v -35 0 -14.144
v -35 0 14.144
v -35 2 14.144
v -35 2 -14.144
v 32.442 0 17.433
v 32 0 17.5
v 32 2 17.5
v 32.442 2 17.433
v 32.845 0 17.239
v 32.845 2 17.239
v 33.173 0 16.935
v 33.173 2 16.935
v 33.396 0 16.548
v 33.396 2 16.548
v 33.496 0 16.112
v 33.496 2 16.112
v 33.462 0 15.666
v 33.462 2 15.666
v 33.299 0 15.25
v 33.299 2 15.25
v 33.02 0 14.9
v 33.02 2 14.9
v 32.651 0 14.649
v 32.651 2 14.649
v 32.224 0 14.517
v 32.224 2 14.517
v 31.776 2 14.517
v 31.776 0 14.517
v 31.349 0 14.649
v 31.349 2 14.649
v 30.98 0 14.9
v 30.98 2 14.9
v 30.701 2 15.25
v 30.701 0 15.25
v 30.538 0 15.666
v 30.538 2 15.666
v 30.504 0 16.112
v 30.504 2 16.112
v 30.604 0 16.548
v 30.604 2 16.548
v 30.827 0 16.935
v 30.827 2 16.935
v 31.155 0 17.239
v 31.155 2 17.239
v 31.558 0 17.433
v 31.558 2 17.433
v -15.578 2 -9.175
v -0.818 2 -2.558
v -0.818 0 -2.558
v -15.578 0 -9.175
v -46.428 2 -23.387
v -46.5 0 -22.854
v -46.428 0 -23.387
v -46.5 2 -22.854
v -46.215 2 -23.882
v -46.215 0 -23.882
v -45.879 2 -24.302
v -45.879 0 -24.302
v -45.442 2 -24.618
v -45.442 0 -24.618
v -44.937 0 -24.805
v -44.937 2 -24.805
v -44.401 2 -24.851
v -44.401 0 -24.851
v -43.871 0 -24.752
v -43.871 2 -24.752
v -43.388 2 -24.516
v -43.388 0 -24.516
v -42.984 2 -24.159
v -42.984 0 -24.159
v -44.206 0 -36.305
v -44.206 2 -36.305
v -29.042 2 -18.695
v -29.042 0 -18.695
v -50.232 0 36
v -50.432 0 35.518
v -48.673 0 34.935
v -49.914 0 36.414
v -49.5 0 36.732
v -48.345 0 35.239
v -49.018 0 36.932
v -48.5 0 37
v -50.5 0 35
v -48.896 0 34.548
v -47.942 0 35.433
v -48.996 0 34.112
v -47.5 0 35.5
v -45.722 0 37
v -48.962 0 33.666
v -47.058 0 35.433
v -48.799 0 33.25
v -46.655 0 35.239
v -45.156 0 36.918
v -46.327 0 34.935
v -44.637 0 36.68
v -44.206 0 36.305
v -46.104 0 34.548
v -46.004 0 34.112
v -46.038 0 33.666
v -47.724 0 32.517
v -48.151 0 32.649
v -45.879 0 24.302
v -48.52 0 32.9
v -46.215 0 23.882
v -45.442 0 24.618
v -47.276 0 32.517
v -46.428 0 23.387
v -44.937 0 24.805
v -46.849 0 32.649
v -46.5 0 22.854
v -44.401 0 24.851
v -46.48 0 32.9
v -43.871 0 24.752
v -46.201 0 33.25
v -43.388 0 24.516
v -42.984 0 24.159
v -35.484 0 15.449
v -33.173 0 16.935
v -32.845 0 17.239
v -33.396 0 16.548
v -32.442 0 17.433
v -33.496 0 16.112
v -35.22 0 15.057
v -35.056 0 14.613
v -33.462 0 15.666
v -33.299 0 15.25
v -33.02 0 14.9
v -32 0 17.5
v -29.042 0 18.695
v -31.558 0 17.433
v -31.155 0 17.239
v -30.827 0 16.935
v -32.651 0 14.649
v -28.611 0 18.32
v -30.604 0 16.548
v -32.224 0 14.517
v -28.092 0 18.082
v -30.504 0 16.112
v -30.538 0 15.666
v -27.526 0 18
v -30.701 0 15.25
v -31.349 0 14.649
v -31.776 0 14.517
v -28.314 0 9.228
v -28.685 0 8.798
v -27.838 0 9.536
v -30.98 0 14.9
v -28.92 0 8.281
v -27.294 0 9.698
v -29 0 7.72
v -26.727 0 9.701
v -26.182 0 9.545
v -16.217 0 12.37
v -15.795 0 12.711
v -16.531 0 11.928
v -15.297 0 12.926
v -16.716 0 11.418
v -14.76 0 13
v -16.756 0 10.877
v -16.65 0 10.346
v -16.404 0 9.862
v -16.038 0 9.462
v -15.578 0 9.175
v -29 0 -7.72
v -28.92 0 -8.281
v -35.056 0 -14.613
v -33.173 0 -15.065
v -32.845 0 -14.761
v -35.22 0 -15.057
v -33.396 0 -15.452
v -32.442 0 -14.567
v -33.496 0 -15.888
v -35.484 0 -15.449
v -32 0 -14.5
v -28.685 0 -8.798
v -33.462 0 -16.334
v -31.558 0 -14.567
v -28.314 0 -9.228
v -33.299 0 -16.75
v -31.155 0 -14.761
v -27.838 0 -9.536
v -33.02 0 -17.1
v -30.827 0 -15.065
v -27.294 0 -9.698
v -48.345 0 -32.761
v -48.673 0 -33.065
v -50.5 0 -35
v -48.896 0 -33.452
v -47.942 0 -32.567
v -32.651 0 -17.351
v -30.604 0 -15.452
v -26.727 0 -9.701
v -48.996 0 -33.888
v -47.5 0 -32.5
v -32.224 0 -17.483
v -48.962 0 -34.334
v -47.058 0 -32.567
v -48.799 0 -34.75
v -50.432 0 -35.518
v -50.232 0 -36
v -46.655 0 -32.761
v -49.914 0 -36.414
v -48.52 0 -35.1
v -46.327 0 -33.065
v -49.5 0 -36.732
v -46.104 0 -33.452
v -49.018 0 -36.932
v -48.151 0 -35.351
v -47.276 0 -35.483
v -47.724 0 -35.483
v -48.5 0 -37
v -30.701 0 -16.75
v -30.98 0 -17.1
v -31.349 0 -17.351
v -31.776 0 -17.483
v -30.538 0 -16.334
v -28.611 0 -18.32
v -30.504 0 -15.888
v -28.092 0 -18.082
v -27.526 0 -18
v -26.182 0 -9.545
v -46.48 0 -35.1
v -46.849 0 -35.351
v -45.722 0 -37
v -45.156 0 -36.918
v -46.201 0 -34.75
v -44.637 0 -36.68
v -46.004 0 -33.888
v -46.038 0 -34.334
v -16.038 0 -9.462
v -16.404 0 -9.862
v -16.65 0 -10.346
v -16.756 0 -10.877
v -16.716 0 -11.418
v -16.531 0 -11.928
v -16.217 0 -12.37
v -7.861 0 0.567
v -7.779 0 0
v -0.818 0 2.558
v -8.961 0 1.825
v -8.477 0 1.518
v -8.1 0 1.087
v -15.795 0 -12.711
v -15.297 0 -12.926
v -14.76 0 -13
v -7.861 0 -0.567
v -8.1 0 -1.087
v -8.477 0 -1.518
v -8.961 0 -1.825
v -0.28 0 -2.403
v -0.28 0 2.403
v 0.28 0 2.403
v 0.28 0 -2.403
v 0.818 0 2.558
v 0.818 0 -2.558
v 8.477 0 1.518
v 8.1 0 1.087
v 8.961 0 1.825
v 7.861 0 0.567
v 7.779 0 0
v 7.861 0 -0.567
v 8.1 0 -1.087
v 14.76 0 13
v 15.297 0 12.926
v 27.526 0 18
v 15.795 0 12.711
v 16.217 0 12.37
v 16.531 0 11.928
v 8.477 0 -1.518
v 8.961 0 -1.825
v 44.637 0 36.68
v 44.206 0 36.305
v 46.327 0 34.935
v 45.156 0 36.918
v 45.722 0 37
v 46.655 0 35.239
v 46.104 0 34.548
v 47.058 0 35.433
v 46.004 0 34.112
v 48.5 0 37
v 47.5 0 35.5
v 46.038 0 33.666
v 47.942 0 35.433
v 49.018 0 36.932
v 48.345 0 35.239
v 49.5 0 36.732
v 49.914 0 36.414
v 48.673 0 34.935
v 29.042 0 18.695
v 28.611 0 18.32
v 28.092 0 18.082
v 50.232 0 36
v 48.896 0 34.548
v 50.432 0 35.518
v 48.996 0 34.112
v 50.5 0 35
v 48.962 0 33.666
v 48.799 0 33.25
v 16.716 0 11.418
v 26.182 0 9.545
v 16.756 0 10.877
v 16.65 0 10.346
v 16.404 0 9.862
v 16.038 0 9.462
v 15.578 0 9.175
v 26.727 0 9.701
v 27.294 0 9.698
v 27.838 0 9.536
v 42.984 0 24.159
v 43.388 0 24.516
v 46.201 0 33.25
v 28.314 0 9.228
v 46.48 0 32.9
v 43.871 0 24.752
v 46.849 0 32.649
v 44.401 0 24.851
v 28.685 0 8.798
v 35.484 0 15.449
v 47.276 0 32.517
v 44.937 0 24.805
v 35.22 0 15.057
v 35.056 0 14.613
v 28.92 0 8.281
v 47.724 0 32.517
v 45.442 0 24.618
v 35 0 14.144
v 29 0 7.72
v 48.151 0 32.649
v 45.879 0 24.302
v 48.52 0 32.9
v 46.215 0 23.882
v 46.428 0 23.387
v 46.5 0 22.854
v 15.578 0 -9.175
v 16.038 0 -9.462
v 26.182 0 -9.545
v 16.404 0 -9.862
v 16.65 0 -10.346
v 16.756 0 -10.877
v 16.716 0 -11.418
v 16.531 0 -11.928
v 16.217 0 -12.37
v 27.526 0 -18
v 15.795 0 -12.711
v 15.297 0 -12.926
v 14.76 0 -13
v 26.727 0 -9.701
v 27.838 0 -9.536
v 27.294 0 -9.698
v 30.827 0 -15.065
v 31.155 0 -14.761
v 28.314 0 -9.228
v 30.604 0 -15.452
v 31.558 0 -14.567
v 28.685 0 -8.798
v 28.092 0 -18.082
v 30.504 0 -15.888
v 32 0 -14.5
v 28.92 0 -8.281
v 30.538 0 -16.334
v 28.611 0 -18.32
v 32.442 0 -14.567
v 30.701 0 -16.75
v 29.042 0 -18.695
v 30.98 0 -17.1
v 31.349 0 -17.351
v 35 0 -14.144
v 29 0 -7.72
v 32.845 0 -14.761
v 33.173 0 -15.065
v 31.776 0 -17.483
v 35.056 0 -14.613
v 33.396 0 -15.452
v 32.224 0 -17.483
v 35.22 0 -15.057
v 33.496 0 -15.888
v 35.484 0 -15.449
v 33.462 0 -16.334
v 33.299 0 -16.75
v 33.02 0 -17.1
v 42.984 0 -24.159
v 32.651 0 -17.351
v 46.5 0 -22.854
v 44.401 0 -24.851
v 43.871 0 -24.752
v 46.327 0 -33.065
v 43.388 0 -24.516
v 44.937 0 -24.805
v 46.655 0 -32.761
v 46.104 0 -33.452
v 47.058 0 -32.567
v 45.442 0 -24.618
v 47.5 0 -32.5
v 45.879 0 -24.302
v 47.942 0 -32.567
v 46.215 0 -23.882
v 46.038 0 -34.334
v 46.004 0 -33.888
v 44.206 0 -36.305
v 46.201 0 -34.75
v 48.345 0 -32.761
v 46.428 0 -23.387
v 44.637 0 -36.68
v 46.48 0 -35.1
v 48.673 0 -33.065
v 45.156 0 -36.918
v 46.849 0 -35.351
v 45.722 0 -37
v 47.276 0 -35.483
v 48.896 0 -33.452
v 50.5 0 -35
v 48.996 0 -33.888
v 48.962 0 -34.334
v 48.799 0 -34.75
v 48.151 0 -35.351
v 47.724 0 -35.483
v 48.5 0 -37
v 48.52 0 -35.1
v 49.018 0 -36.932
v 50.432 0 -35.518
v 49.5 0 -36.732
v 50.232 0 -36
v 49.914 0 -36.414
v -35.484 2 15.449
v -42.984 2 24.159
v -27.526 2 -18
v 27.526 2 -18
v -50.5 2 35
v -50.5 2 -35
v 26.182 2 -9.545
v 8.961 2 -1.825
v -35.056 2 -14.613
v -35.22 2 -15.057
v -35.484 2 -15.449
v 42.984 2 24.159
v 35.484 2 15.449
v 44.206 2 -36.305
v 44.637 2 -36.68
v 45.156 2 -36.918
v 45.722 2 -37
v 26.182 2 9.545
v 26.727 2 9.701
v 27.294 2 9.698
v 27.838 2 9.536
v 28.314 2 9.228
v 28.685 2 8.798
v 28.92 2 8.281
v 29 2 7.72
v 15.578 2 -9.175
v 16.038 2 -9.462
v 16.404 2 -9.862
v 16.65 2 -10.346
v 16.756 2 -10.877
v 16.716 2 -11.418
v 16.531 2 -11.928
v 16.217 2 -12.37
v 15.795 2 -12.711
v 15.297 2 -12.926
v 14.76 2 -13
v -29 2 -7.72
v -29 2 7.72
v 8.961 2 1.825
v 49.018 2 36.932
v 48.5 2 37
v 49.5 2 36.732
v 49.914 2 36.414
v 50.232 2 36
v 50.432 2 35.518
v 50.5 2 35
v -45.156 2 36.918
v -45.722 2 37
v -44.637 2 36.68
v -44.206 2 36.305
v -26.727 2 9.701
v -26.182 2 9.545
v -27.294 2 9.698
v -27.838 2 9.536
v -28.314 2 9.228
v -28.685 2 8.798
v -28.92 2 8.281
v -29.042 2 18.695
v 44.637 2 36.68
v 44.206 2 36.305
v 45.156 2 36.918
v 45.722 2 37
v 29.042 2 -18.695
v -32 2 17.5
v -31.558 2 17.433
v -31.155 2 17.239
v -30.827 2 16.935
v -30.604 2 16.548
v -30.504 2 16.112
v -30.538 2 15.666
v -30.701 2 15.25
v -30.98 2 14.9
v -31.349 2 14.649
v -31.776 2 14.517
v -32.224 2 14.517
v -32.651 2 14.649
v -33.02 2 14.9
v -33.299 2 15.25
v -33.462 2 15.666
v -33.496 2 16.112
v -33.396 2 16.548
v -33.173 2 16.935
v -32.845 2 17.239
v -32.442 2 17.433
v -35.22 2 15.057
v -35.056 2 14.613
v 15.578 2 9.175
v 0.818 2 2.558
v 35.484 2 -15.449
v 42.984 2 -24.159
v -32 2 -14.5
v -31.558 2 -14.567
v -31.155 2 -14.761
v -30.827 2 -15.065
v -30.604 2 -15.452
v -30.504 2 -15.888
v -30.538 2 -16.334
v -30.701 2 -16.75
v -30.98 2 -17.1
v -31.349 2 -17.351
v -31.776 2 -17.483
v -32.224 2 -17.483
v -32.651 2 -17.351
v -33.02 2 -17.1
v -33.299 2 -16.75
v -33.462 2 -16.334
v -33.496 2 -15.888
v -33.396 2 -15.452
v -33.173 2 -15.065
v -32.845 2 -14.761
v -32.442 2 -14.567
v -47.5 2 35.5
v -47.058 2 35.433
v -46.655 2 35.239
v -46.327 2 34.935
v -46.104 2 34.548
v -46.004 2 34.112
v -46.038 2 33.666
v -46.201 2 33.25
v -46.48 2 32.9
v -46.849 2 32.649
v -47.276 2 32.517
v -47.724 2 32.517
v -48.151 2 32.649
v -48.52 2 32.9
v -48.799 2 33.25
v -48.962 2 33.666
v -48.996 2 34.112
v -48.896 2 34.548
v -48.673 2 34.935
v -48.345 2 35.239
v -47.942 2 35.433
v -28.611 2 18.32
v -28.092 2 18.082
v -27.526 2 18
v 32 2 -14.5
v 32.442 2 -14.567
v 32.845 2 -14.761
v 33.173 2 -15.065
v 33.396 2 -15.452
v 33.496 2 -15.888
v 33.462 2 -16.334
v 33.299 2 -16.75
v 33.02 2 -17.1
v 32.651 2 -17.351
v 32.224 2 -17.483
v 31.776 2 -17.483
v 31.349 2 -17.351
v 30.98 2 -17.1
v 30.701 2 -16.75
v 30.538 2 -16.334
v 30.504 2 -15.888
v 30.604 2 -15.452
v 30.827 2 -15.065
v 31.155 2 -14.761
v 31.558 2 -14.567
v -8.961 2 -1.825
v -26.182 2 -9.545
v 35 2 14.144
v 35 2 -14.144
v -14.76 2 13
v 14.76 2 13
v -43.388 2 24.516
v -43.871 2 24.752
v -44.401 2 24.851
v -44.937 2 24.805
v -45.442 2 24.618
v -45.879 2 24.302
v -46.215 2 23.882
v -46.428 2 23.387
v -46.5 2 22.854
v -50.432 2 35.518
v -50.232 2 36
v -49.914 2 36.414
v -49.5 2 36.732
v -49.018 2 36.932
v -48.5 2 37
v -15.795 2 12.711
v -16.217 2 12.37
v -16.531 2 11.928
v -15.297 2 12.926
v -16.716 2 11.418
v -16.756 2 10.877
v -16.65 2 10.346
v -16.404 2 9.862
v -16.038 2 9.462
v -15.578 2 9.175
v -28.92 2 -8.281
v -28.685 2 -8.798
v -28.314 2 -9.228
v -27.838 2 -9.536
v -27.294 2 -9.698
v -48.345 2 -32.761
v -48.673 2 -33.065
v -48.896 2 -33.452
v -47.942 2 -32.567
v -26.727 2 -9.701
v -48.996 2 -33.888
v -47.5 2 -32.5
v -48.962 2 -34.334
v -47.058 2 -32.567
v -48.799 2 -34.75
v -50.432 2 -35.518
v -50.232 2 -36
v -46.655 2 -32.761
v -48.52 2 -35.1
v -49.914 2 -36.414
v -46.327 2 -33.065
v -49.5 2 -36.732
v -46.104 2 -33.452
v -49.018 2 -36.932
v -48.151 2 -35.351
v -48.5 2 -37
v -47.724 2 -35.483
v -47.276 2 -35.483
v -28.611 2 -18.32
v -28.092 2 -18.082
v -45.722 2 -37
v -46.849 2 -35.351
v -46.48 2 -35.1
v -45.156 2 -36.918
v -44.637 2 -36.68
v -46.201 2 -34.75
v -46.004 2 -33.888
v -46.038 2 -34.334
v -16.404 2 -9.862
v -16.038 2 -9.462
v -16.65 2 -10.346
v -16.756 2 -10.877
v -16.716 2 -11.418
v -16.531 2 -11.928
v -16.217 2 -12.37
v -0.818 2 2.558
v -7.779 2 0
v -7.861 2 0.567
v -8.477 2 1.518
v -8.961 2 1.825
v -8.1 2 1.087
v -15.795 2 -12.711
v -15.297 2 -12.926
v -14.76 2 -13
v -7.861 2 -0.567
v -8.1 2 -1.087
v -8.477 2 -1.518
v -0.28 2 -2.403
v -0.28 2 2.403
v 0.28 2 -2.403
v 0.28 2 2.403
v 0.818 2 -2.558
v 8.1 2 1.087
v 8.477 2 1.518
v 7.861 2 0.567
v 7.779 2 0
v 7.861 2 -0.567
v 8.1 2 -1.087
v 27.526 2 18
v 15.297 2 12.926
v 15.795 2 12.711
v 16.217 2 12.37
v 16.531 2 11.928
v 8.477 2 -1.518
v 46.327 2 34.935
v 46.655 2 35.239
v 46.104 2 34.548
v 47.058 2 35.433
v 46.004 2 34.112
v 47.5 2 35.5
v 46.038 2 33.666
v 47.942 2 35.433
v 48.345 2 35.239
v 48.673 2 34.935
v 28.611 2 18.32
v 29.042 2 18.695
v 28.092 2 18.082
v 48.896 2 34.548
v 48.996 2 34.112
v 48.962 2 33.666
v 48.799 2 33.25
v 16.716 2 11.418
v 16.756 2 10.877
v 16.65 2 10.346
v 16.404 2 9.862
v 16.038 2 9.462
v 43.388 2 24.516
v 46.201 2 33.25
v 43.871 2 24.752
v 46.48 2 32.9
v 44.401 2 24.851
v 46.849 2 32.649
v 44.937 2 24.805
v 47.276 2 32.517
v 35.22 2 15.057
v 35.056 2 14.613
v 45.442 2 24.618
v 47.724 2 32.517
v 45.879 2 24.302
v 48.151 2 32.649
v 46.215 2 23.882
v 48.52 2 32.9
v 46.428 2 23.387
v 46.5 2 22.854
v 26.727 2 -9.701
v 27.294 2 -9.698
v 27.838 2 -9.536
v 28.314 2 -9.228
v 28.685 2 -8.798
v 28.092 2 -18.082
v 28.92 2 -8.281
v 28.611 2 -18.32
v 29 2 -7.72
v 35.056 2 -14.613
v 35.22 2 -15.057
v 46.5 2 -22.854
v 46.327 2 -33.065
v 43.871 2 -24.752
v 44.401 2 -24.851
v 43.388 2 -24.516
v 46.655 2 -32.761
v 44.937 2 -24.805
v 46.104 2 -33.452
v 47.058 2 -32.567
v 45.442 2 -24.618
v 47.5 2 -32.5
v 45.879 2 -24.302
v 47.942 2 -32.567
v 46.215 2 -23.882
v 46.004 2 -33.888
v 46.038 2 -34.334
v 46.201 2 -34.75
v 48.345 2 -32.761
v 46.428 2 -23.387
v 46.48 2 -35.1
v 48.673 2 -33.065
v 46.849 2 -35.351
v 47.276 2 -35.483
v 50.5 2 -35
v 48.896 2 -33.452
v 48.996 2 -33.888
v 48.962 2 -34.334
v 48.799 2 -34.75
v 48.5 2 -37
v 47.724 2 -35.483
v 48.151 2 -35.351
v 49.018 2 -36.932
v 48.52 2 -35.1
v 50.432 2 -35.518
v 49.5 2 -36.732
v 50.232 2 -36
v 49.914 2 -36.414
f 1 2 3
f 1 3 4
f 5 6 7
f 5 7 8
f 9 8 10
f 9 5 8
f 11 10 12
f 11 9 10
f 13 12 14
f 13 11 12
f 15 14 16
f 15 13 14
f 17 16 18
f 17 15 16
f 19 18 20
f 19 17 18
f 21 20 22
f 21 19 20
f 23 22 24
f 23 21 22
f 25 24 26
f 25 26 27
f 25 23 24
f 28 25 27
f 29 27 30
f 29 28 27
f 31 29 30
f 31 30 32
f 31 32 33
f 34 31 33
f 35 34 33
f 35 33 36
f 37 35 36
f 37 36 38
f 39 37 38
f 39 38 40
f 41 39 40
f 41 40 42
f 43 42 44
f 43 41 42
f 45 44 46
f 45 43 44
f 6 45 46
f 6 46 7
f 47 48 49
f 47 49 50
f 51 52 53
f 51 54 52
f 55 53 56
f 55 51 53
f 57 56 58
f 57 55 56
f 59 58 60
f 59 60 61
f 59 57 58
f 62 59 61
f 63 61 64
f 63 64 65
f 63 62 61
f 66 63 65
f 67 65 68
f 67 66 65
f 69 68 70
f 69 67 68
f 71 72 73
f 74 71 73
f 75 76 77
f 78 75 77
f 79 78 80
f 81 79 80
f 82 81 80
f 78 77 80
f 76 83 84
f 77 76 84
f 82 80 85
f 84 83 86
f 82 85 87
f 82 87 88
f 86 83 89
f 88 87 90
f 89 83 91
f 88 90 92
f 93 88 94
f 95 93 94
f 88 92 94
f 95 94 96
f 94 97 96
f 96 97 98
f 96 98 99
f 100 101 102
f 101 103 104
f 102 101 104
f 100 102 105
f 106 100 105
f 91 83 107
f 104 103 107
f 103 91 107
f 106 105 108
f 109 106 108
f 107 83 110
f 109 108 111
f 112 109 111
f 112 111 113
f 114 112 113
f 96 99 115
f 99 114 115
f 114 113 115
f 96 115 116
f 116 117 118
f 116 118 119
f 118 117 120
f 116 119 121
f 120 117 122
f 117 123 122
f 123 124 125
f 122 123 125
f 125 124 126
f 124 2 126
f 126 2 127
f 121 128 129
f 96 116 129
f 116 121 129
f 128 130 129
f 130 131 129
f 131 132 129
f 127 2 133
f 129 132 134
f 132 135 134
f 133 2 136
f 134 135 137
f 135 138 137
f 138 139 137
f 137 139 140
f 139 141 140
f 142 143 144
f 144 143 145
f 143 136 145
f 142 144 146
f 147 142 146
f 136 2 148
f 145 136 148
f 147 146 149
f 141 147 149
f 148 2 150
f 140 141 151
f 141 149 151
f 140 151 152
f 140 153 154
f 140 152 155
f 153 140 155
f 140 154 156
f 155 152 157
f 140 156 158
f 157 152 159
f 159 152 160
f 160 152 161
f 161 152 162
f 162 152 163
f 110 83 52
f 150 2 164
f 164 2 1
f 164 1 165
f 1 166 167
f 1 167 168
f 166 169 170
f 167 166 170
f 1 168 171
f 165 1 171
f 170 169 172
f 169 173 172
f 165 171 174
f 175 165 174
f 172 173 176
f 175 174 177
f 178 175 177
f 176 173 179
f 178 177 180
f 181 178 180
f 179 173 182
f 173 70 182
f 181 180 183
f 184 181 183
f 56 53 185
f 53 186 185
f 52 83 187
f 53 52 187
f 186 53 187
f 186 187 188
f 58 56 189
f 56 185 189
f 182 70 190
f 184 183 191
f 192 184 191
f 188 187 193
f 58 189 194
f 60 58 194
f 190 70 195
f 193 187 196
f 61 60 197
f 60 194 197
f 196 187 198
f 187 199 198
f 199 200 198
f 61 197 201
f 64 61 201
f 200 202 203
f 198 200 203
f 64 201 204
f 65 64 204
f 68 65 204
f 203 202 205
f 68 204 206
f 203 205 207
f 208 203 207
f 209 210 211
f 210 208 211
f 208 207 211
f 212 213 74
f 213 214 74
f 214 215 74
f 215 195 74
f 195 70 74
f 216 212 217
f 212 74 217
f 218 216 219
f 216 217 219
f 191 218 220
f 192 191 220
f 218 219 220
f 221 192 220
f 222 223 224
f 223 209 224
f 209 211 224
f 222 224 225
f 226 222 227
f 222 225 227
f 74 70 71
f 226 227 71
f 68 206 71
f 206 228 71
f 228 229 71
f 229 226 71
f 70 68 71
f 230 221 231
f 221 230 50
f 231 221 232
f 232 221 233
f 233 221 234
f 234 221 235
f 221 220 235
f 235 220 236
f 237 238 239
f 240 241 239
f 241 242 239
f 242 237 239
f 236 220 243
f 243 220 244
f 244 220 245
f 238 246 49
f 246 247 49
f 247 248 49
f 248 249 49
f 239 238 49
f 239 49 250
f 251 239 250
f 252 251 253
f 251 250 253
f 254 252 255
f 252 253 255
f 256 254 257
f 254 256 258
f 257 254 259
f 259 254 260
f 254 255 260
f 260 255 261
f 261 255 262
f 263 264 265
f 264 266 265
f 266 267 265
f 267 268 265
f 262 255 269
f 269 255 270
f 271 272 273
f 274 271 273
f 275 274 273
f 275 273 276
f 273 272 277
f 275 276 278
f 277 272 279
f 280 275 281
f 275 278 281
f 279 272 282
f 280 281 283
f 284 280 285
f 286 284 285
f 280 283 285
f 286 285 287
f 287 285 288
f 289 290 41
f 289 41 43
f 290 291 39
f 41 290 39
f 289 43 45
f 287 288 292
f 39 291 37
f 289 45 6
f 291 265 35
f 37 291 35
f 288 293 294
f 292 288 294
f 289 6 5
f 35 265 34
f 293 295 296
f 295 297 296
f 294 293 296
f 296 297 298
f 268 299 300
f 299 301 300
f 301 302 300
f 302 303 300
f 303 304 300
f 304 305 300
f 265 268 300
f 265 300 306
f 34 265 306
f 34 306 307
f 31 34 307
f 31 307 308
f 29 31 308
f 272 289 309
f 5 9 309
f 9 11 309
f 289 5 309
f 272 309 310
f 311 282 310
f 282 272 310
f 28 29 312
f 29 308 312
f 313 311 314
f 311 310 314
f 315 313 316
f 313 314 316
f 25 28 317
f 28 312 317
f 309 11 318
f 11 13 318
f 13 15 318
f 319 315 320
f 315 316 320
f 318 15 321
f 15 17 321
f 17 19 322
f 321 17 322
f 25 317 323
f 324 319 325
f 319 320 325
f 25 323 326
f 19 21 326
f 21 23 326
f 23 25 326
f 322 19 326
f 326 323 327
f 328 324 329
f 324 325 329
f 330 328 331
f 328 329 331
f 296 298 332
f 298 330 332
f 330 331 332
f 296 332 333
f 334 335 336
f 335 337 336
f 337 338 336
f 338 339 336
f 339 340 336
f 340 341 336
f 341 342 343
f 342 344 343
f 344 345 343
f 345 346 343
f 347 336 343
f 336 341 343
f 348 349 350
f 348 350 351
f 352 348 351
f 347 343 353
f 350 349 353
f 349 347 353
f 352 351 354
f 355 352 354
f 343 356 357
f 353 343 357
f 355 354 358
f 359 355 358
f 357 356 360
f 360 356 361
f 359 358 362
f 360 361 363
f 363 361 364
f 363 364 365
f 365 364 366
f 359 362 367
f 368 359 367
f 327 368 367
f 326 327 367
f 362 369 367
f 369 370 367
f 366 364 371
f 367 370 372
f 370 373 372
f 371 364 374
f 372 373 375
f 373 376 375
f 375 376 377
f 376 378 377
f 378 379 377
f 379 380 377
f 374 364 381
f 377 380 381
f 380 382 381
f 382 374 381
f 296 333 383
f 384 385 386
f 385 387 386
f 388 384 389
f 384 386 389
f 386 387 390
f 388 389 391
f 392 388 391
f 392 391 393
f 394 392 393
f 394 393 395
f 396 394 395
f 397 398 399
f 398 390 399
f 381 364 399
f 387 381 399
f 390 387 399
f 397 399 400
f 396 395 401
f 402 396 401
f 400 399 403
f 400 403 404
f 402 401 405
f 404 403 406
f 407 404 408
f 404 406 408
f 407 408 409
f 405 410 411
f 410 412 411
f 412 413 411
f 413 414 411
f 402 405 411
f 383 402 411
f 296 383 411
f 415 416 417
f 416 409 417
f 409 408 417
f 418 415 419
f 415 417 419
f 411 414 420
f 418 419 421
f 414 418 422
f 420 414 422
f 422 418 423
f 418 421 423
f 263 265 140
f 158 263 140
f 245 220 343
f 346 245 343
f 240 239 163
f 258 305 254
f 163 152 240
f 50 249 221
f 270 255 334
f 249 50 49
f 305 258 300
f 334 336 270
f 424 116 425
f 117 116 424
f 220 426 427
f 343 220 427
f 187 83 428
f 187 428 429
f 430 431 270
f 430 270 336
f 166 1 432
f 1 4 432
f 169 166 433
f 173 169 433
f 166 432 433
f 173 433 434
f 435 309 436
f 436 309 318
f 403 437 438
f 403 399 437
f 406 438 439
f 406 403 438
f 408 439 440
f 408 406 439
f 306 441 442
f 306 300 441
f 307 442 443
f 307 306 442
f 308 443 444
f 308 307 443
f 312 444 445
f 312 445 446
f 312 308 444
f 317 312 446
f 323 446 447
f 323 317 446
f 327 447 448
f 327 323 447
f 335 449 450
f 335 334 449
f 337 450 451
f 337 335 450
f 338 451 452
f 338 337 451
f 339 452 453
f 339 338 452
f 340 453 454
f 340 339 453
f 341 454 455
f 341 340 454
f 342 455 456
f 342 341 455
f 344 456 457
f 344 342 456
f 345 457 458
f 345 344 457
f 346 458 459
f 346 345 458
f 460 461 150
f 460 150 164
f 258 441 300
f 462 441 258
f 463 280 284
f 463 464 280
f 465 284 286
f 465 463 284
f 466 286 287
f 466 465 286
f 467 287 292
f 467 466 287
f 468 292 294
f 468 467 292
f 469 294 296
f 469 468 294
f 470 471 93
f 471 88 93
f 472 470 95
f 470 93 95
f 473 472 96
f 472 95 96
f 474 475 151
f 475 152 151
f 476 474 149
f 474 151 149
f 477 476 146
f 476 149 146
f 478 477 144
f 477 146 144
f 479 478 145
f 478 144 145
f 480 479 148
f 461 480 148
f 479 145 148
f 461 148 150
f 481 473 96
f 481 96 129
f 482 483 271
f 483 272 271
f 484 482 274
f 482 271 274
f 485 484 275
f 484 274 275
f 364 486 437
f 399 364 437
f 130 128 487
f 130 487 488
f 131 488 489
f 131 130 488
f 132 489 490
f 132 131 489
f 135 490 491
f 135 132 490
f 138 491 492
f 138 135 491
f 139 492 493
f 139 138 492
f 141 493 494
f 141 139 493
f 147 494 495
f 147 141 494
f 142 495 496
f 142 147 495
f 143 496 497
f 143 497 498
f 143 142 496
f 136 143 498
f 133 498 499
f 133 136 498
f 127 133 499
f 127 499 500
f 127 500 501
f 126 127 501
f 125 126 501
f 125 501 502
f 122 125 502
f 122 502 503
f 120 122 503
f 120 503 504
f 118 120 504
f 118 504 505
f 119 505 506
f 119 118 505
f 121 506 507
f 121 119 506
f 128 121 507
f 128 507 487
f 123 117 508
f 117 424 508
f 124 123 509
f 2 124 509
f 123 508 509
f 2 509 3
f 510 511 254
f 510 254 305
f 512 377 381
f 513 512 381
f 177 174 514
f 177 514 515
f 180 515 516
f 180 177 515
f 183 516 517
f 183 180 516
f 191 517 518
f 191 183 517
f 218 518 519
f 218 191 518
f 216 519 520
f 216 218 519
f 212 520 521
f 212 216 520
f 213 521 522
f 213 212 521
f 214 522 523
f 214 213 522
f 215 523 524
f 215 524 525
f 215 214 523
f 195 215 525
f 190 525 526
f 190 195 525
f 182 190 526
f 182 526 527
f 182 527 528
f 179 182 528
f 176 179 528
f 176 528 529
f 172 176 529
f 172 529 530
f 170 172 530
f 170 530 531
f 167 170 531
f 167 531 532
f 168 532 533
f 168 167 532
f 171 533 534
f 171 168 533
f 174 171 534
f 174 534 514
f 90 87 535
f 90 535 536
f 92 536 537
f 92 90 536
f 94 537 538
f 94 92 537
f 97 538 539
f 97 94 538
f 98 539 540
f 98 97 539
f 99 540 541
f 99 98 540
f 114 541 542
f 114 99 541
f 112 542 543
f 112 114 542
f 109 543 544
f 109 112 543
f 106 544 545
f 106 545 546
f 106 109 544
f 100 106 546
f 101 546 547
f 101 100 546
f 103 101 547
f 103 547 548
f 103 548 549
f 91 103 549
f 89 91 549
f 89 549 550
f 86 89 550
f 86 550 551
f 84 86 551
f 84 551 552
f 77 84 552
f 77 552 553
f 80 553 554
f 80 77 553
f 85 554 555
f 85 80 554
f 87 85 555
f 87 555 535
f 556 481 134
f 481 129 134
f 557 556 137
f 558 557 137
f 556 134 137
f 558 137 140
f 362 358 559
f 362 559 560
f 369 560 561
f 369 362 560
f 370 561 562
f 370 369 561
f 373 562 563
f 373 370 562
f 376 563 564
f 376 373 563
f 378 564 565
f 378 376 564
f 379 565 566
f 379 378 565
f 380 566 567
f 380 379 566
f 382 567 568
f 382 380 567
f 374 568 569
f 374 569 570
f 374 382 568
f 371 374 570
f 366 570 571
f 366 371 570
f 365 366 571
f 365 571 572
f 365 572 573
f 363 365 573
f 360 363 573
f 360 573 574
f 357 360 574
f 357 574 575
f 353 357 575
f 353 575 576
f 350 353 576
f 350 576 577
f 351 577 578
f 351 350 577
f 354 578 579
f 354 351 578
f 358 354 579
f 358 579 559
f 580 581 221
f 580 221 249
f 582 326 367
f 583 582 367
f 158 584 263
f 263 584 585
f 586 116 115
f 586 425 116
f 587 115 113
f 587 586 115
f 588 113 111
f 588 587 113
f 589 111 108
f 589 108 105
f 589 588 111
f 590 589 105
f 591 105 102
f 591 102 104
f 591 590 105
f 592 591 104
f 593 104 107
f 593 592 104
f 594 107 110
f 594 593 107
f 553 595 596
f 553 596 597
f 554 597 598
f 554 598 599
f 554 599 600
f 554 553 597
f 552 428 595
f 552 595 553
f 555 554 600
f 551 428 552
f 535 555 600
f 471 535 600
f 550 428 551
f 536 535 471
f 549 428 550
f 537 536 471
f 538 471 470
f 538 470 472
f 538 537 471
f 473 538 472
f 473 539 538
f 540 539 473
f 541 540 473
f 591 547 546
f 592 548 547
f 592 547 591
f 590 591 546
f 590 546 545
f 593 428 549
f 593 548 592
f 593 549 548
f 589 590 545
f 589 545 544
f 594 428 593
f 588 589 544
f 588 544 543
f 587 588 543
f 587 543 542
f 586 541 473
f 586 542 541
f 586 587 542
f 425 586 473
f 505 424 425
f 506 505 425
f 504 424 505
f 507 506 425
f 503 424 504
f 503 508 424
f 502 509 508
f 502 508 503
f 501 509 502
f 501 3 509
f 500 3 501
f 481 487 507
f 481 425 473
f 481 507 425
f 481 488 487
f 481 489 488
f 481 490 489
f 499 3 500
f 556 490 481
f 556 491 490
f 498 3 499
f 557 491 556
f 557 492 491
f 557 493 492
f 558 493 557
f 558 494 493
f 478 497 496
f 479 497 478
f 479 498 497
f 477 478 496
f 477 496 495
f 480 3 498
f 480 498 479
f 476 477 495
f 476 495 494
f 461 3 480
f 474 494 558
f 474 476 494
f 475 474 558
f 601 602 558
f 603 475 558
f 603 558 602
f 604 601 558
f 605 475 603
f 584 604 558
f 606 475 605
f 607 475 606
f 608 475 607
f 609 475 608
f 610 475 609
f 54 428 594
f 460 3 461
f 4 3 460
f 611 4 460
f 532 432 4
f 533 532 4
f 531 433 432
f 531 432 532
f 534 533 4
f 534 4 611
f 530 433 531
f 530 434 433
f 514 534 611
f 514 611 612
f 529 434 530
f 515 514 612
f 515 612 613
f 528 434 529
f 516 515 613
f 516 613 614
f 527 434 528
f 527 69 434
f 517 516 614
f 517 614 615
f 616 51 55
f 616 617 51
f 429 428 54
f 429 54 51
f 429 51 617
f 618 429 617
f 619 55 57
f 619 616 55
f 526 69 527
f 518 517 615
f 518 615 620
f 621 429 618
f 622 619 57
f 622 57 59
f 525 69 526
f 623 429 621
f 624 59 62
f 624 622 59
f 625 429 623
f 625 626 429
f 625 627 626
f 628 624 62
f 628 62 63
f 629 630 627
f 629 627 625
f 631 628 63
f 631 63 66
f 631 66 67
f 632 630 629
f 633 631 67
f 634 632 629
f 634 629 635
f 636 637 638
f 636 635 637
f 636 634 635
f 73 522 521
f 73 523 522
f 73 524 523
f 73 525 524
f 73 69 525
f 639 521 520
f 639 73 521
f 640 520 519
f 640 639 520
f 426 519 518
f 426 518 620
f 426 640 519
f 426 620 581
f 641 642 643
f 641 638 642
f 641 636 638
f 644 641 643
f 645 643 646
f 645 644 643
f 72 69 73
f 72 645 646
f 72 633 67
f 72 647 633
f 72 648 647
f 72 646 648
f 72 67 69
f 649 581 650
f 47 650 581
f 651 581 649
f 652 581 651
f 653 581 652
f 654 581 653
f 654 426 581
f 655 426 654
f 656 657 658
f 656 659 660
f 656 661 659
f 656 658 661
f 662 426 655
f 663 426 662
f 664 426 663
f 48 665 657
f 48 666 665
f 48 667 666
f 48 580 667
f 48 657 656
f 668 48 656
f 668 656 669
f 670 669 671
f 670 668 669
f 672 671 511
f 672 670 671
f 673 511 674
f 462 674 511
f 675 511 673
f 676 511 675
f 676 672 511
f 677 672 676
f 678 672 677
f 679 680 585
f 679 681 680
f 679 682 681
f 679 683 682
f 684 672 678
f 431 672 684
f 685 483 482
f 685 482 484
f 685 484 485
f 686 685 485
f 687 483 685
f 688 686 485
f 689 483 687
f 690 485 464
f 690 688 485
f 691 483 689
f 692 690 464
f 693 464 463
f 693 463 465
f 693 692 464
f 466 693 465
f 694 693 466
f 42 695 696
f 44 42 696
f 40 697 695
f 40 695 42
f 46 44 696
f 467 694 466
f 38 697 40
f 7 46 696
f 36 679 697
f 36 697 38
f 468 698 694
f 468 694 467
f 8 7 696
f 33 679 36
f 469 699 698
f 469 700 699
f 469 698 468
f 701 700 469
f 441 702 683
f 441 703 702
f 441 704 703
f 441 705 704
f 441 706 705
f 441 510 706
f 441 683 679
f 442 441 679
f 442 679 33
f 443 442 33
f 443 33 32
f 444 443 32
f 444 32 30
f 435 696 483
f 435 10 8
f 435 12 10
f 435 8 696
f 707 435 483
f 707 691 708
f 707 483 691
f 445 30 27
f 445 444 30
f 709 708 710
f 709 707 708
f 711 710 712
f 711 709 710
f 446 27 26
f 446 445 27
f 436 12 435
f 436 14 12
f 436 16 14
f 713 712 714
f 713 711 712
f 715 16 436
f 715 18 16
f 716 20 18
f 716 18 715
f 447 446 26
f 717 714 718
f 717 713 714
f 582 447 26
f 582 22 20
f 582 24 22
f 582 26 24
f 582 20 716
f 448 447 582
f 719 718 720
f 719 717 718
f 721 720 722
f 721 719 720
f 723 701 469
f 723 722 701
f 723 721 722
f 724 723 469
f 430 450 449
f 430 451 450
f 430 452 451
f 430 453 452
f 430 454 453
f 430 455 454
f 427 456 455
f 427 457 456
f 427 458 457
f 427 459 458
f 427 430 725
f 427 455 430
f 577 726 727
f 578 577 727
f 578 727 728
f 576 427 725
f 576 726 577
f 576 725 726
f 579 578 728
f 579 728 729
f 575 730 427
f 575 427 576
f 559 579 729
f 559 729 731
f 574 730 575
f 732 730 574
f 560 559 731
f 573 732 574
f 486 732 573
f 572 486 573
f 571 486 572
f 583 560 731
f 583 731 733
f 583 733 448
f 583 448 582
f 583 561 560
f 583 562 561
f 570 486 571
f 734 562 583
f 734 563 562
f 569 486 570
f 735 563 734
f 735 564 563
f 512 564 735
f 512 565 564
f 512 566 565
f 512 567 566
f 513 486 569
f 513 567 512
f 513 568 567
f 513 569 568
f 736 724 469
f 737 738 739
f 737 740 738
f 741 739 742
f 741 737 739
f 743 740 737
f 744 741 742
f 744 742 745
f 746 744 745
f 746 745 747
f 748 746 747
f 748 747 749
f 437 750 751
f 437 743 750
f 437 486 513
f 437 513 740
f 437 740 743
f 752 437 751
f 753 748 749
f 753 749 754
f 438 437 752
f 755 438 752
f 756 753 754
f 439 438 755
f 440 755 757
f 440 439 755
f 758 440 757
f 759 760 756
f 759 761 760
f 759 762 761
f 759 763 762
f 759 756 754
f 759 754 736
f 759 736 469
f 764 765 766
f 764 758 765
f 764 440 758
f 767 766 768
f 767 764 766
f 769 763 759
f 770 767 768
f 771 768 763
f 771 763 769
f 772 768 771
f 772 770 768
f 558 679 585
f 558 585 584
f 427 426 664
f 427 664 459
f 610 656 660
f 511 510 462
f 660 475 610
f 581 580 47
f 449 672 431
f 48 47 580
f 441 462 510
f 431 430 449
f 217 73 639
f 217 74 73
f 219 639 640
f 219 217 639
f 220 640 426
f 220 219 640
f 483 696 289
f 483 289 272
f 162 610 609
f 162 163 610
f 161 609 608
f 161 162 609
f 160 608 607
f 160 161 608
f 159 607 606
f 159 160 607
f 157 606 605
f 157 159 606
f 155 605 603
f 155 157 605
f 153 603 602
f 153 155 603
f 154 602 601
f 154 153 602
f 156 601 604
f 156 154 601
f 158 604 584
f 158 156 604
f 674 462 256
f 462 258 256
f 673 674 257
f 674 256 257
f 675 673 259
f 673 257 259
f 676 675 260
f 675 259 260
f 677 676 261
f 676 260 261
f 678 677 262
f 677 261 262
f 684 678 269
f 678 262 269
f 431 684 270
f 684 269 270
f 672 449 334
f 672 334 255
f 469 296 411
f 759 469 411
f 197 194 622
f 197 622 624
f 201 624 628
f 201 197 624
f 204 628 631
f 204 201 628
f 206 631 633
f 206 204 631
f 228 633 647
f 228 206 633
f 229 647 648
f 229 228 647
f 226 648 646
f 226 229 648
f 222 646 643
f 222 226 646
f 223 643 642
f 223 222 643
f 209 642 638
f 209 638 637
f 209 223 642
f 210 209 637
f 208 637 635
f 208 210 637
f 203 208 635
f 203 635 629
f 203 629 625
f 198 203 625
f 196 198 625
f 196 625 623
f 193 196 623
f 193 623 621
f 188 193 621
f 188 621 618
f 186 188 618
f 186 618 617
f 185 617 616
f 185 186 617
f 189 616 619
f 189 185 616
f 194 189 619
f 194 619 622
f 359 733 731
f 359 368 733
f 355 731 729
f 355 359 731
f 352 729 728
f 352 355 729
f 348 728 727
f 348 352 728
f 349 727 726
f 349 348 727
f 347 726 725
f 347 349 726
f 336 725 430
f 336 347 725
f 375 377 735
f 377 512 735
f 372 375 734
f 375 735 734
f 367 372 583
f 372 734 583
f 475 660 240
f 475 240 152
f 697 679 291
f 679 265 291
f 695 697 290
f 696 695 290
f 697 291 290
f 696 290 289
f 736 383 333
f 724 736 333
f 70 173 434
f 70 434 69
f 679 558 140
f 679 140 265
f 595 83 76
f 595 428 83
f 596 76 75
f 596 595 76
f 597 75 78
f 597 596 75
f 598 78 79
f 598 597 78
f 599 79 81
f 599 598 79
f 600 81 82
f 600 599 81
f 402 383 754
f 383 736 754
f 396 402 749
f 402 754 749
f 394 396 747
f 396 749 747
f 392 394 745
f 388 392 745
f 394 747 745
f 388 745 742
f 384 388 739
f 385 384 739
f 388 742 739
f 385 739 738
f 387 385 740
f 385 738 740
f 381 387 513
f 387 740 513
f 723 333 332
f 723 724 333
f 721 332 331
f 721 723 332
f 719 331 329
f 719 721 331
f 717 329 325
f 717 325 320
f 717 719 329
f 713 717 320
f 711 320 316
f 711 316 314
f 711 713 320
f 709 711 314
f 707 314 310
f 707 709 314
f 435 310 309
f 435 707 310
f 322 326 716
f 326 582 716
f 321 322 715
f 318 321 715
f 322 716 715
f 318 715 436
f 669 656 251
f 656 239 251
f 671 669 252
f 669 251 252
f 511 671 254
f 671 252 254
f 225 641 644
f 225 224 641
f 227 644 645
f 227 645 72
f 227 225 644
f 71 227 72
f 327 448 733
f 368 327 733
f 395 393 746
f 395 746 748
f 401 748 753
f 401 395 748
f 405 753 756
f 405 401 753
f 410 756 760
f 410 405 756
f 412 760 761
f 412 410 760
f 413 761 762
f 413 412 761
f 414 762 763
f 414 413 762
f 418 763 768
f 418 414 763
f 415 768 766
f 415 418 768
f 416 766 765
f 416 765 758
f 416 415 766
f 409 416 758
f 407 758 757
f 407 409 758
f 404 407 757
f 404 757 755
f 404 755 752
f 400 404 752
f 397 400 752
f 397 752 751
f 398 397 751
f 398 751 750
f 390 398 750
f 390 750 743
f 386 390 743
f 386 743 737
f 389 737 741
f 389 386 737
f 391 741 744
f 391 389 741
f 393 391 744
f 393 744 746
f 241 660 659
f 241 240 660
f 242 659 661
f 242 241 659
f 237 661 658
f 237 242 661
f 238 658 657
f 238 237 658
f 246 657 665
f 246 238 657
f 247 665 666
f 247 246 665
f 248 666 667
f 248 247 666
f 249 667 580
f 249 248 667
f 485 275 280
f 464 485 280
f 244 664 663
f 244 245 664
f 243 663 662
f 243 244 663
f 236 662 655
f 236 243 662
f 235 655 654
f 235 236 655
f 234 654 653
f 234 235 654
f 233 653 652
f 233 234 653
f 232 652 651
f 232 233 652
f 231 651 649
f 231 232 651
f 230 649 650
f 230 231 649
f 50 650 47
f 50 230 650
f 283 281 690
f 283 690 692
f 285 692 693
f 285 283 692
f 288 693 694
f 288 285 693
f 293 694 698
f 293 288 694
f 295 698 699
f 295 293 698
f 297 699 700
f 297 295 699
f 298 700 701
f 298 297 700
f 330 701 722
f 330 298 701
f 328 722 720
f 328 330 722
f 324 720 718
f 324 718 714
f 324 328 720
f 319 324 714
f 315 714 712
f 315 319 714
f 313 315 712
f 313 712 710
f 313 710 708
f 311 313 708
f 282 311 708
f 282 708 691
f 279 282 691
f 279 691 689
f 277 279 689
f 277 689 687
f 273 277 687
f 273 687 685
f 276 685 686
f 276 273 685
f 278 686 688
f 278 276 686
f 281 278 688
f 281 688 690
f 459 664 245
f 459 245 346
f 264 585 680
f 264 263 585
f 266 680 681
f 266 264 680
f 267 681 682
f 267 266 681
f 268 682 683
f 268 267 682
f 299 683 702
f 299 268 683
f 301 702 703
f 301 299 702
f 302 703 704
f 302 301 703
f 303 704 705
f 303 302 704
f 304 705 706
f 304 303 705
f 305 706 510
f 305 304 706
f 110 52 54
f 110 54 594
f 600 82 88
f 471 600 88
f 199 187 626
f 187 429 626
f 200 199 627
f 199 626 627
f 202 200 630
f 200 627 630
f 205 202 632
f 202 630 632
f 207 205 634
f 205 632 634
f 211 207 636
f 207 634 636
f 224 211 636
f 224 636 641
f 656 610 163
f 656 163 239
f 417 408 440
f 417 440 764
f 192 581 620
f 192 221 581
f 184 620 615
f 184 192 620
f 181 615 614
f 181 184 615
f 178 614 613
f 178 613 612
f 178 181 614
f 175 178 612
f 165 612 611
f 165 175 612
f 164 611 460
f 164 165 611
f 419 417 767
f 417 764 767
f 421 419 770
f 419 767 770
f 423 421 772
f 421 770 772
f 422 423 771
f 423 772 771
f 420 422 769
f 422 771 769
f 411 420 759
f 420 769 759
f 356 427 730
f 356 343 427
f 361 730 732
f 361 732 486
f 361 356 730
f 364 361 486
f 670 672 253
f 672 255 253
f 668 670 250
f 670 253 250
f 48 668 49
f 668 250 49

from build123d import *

# Parameters (mm, degrees)
SKETCH_1_W          = 101
SKETCH_1_H          = 74
SKETCH_1_R          = 1.5
EXTRUDE_1_DEPTH     = 2
SKETCH_2_W          = 58
SKETCH_2_H          = 26
CUT_EXTRUDE_1_DEPTH = 2
CUT_EXTRUDE_2_DEPTH = 2
EXTRUDE_2_DEPTH     = 2
CUT_EXTRUDE_3_DEPTH = 2
FILLET_1_R          = 2


with BuildPart() as part:
    # 草图1 → 凸台-拉伸1 (new body)
    with BuildSketch(Plane(origin=(0, 0, 0), x_dir=(1, 0, 0), z_dir=(0, 1, 0))):
        Rectangle(SKETCH_1_W, SKETCH_1_H)
        with Locations(Location((32, -16, 0), (0, 0, 270))):
            Circle(SKETCH_1_R, mode=Mode.SUBTRACT)
        with Locations(Location((32, 16, 0), (0, 0, 270))):
            Circle(SKETCH_1_R, mode=Mode.SUBTRACT)
        with Locations(Location((-32, 16, 0), (0, 0, 270))):
            Circle(SKETCH_1_R, mode=Mode.SUBTRACT)
        with Locations(Location((-32, -16, 0), (0, 0, 270))):
            Circle(SKETCH_1_R, mode=Mode.SUBTRACT)
        with Locations(Location((47.5, 34, 0), (0, 0, 270))):
            Circle(SKETCH_1_R, mode=Mode.SUBTRACT)
        with Locations(Location((-47.5, 34, 0), (0, 0, 270))):
            Circle(SKETCH_1_R, mode=Mode.SUBTRACT)
        with Locations(Location((-47.5, -34, 0), (0, 0, 270))):
            Circle(SKETCH_1_R, mode=Mode.SUBTRACT)
        with Locations(Location((47.5, -34, 0), (0, 0, 270))):
            Circle(SKETCH_1_R, mode=Mode.SUBTRACT)
    extrude(amount=EXTRUDE_1_DEPTH)

    # 草图2 → 切除-拉伸1 (cut)
    with BuildSketch(Plane(origin=(0, 2, 0), x_dir=(1, 0, 0), z_dir=(0, 1, 0))):
        Rectangle(SKETCH_2_W, SKETCH_2_H)
    extrude(amount=-CUT_EXTRUDE_1_DEPTH, mode=Mode.SUBTRACT)

    # 草图3 → 切除-拉伸2 (cut)
    with BuildSketch(Plane(origin=(0, 2, 0), x_dir=(1, 0, 0), z_dir=(0, 1, 0))):
        Polygon((-44.804678435, 37), (-28.443567324, 18), (28.443567324, 18), (44.804678435, 37), align=None)
    cut_extrude_2 = extrude(amount=-CUT_EXTRUDE_2_DEPTH, mode=Mode.SUBTRACT)

    # 镜向1: 切除-拉伸2 across plane
    add(cut_extrude_2.mirror(Plane.XY), mode=Mode.SUBTRACT)

    # 草图4 → 凸台-拉伸2 (add)
    with BuildSketch(Plane(origin=(0, 2, 0), x_dir=(1, 0, 0), z_dir=(0, 1, 0))):
        Polygon((0, -2.191758425), (-4.889307256, 0), (-29, -10.808241575), (-29, -13), (-24.110692744, -13), align=None)
        Polygon((-29, 13), (-29, 10.808241575), (-4.889307256, 0), (0, 2.191758425), (-24.110692744, 13), align=None)
        Polygon((0, 2.191758425), (-4.889307256, 0), (0, -2.191758425), (4.889307256, 0), align=None)
        Polygon((24.110692744, 13), (0, 2.191758425), (4.889307256, 0), (29, 10.808241575), (29, 13), align=None)
        Polygon((4.889307256, 0), (0, -2.191758425), (24.110692744, -13), (29, -13), (29, -10.808241575), align=None)
    extrude(amount=-EXTRUDE_2_DEPTH)

    # 草图5 → 切除-拉伸3 (cut)
    with BuildSketch(Plane.XZ):
        Polygon((-46.5, 28.241171541), (-35, 14.886332831), (-35, -14.886332831), (-46.5, -28.241171541), align=None)
    cut_extrude_3 = extrude(amount=-CUT_EXTRUDE_3_DEPTH, mode=Mode.SUBTRACT)

    # 镜向2: 切除-拉伸3 across plane
    add(cut_extrude_3.mirror(Plane(origin=(0, 0, 0), x_dir=(0, 0, 1), z_dir=(1, 0, 0))), mode=Mode.SUBTRACT)

    # 圆角1
    fillet_1_edges = [part.edges().sort_by_distance(p)[0] for p in [
        (0, 1, 2.191758425),
        (-24.110692744, 1, 13),
        (-29, 1, 10.808241575),
        (-4.889307256, 1, 0),
        (-29, 1, -10.808241575),
        (-24.110692744, 1, -13),
        (0, 1, -2.191758425),
        (24.110692744, 1, -13),
        (29, 1, -10.808241575),
        (4.889307256, 1, 0),
        (29, 1, 10.808241575),
        (24.110692744, 1, 13),
        (-46.5, 1, -28.241171541),
        (-46.5, 1, 28.241171541),
        (-35, 1, 14.886332831),
        (-35, 1, -14.886332831),
        (46.5, 1, 28.241171541),
        (46.5, 1, -28.241171541),
        (35, 1, -14.886332831),
        (35, 1, 14.886332831),
        (-44.804678435, 1, -37),
        (44.804678435, 1, -37),
        (28.443567324, 1, -18),
        (-28.443567324, 1, -18),
        (-50.5, 1, 37),
        (-50.5, 1, -37),
        (50.5, 1, -37),
        (50.5, 1, 37),
        (44.804678435, 1, 37),
        (-44.804678435, 1, 37),
        (-28.443567324, 1, 18),
        (28.443567324, 1, 18),
    ]]
    fillet(fillet_1_edges, radius=FILLET_1_R)


solid = part.part
